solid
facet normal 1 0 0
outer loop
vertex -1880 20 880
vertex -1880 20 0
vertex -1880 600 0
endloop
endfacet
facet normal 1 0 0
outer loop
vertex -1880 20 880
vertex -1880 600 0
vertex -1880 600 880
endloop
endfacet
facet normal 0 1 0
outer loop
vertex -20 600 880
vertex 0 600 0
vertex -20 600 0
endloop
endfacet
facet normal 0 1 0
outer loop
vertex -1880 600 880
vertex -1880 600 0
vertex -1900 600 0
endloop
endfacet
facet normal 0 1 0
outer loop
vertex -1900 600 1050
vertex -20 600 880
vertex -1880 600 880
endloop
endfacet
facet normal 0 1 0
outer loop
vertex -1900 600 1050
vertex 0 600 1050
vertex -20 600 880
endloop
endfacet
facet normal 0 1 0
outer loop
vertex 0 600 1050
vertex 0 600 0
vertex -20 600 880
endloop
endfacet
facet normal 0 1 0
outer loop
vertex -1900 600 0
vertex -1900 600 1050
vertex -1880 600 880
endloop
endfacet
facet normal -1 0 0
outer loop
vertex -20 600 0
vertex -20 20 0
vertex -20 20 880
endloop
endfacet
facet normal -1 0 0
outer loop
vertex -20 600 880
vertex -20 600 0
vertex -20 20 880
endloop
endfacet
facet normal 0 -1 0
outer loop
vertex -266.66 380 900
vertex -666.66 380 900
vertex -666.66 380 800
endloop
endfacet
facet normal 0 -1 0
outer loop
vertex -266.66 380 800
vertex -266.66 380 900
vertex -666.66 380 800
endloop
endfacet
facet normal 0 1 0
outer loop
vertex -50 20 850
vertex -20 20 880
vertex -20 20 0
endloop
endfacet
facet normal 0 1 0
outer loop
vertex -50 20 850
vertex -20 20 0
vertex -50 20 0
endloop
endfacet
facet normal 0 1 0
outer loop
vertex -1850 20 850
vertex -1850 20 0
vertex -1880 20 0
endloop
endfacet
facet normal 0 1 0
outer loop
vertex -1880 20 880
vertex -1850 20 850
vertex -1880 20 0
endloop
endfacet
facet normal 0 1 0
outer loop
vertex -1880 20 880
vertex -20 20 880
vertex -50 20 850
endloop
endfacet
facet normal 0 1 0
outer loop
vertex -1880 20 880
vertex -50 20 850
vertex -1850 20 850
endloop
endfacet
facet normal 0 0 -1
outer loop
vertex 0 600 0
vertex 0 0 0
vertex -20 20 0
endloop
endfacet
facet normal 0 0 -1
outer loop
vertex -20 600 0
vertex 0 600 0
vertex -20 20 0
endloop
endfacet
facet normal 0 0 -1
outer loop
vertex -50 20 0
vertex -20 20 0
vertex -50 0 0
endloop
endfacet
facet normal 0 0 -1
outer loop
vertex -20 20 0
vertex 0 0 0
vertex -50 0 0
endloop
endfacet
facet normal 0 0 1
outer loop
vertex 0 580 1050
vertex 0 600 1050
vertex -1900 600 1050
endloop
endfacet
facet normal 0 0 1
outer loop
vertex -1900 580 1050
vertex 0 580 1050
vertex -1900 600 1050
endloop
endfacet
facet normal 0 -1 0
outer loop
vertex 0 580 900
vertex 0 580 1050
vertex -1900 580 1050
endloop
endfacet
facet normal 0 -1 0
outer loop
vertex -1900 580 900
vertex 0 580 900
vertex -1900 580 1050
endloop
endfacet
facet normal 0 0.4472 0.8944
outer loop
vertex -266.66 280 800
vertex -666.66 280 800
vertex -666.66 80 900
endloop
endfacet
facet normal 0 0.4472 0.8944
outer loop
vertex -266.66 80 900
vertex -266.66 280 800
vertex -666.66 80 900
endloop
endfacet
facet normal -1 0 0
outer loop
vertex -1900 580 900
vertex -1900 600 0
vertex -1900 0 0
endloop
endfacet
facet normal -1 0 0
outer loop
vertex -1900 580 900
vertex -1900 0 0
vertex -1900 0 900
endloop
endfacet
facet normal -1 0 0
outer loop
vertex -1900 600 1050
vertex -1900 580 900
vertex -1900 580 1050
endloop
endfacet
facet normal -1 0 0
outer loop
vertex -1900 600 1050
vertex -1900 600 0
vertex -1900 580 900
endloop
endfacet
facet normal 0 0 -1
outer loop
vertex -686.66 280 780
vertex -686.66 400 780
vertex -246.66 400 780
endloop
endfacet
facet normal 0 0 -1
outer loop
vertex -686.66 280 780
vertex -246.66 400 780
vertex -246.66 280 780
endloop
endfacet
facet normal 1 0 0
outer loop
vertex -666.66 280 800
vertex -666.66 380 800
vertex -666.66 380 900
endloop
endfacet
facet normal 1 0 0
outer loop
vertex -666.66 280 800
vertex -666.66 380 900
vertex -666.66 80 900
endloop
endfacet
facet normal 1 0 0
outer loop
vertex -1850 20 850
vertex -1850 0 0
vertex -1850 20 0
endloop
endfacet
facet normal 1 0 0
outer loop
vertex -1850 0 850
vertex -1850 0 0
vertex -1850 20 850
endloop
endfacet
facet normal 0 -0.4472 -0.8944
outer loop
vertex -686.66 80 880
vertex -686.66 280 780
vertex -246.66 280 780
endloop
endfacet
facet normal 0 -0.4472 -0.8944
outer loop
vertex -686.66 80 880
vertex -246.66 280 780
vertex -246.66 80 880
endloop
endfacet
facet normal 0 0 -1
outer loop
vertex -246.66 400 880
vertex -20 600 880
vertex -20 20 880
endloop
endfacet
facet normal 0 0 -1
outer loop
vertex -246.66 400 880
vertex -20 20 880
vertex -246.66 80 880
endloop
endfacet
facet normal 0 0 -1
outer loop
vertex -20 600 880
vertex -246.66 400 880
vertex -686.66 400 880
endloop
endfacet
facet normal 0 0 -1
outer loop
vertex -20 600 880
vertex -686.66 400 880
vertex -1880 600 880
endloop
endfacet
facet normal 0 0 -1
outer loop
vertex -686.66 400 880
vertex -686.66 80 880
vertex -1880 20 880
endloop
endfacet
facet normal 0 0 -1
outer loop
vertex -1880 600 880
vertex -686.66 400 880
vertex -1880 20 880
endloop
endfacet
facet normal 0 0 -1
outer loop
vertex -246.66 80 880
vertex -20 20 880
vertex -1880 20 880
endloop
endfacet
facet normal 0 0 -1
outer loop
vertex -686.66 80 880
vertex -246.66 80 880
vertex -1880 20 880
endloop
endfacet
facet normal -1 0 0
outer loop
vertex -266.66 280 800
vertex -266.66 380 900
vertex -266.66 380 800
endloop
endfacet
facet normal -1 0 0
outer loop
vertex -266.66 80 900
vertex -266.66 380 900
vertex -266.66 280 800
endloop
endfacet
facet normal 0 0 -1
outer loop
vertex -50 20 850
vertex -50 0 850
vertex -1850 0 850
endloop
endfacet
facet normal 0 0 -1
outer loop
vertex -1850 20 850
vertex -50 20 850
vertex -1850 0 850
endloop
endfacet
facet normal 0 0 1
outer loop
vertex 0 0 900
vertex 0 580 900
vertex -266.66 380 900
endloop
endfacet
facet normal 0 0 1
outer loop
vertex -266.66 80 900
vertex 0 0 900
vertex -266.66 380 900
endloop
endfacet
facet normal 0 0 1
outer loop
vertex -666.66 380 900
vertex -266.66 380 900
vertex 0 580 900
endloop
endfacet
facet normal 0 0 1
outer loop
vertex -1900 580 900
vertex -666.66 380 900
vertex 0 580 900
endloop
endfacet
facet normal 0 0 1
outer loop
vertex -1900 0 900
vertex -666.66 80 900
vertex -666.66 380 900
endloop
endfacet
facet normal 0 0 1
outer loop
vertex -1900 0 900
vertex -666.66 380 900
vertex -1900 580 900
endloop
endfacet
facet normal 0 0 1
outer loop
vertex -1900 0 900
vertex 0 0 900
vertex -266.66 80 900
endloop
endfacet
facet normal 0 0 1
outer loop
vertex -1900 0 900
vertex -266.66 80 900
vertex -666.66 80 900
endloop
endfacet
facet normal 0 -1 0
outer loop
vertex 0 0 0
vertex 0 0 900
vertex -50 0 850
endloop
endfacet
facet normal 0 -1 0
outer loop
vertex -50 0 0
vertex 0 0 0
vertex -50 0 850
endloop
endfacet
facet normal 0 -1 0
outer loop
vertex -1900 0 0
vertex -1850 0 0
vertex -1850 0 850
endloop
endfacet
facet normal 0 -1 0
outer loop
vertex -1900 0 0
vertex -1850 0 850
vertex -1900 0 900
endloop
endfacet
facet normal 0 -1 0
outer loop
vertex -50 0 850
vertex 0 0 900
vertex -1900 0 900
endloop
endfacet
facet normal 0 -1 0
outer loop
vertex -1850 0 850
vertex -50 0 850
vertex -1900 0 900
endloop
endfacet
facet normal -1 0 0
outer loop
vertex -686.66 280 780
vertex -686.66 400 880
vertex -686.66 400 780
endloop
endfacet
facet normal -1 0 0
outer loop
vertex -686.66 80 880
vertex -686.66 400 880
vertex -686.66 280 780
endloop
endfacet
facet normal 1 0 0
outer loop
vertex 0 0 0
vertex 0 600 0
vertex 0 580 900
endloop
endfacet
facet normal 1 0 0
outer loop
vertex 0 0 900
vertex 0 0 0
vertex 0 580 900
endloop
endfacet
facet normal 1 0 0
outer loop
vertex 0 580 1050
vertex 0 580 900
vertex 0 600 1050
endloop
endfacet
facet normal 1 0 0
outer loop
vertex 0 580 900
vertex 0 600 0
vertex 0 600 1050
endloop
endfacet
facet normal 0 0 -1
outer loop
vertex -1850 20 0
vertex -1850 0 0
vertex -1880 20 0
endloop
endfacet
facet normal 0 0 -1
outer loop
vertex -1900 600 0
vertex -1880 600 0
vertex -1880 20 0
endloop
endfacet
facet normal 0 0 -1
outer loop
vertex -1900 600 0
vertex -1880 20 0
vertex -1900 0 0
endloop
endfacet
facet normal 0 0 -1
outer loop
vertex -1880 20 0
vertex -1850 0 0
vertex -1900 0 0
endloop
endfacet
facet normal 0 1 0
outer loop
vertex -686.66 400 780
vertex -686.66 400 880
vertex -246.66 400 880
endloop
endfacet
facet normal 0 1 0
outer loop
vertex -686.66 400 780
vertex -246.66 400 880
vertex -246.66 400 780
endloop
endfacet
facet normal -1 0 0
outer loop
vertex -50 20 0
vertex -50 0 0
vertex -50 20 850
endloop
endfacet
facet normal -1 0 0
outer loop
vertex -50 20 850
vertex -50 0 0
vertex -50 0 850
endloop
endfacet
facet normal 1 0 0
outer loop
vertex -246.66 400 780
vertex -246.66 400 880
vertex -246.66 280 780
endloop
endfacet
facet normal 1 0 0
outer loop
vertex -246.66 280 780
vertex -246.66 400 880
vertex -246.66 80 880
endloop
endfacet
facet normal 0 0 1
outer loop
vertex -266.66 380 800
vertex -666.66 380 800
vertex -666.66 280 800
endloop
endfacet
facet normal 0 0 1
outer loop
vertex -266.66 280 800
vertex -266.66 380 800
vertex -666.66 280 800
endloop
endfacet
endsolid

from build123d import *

# Parameters (mm, degrees)
SKETCH012_W      = 1860
SKETCH012_H      = 880
EXTRUDE019_DEPTH = 580
SKETCH011_W      = 1800
SKETCH011_H      = 850
EXTRUDE018_DEPTH = 20
SKETCH003_W      = 400
SKETCH003_H      = 300
EXTRUDE015_DEPTH = 20
SKETCH004_W      = 1900
SKETCH004_H      = 150
EXTRUDE017_DEPTH = 20
SKETCH_W         = 1900
SKETCH_H         = 900
EXTRUDE016_DEPTH = 600
EXTRUDE006_DEPTH = 400
EXTRUDE007_DEPTH = 440


with BuildPart() as extrude019:
    # Sketch012 → Extrude019 (new body)
    with BuildSketch(Plane.XZ):
        with Locations((930, 440)):
            Rectangle(SKETCH012_W, SKETCH012_H)
    extrude(amount=-EXTRUDE019_DEPTH)


with BuildPart() as extrude019_1:
    # Extrude019 placement: moved
    add(extrude019.part.moved(Location((20, 20, 0))))


with BuildPart() as saia001:
    # Sketch011 → Extrude018 (new body)
    with BuildSketch(Plane.XZ):
        with Locations((900, 425)):
            Rectangle(SKETCH011_W, SKETCH011_H)
    extrude(amount=-EXTRUDE018_DEPTH)


with BuildPart() as saia001_1:
    # Extrude018 placement: moved
    add(saia001.part.moved(Location((50, 0, 0))))


with BuildPart() as fusion016:
    # Sketch003 → Extrude015 (new body)
    with BuildSketch(Plane.XY):
        with Locations((200, 150)):
            Rectangle(SKETCH003_W, SKETCH003_H)
    extrude(amount=EXTRUDE015_DEPTH)


with BuildPart() as fusion016_1:
    # Extrude015 placement: moved
    add(fusion016.part.moved(Location((266.66, 80, 880))))

    # Fusion016: union Extrude019, Saia001
    add(extrude019_1.part)
    add(saia001_1.part)


with BuildPart() as extrude017:
    # Sketch004 → Extrude017 (new body)
    with BuildSketch(Plane.XZ):
        with Locations((950, 75)):
            Rectangle(SKETCH004_W, SKETCH004_H)
    extrude(amount=EXTRUDE017_DEPTH)


with BuildPart() as extrude017_1:
    # Extrude017 placement: moved
    add(extrude017.part.moved(Location((0, 600, 900))))


with BuildPart() as cut013:
    # Sketch → Extrude016 (new body)
    with BuildSketch(Plane.XZ):
        with Locations((950, 450)):
            Rectangle(SKETCH_W, SKETCH_H)
    extrude(amount=-EXTRUDE016_DEPTH)

    # Fusion006: union Extrude017
    add(extrude017_1.part)

    # Cut013: cut Fusion016
    add(fusion016_1.part, mode=Mode.SUBTRACT)


with BuildPart() as extrude006:
    # Sketch006 → Extrude006 (new body)
    with BuildSketch(Plane.YZ):
        Polygon((0, 0), (300, 0), (300, -100), (200, -100), align=None)
    extrude(amount=EXTRUDE006_DEPTH)


with BuildPart() as lavat_rio_cuba_esculpida_2_p_fechado001:
    # Sketch007 → Extrude007 (new body)
    with BuildSketch(Plane.YZ):
        Polygon((-40, 0), (320, 0), (320, -120), (200, -120), align=None)
    extrude(amount=EXTRUDE007_DEPTH)


with BuildPart() as lavat_rio_cuba_esculpida_2_p_fechado001_1:
    # Extrude007 placement: moved
    add(lavat_rio_cuba_esculpida_2_p_fechado001.part.moved(Location((-20, 0, 0))))

    # Cut006: cut Extrude006
    add(extrude006.part, mode=Mode.SUBTRACT)


with BuildPart() as lavat_rio_cuba_esculpida_2_p_fechado001_2:
    # Cut006 placement: moved
    add(lavat_rio_cuba_esculpida_2_p_fechado001_1.part.moved(Location((266.66, 80, 900))))

    # Fusion017: union Cut013
    add(cut013.part)


with BuildPart() as mirror001:
    # Mirror001: instance of Lavatório cuba esculpida 2 pé fechado001
    add(lavat_rio_cuba_esculpida_2_p_fechado001_2.part.mirror(Plane(origin=(0, 0, 0), x_dir=(0, -1, 0), z_dir=(1, 0, 0))))


solid = mirror001.part
